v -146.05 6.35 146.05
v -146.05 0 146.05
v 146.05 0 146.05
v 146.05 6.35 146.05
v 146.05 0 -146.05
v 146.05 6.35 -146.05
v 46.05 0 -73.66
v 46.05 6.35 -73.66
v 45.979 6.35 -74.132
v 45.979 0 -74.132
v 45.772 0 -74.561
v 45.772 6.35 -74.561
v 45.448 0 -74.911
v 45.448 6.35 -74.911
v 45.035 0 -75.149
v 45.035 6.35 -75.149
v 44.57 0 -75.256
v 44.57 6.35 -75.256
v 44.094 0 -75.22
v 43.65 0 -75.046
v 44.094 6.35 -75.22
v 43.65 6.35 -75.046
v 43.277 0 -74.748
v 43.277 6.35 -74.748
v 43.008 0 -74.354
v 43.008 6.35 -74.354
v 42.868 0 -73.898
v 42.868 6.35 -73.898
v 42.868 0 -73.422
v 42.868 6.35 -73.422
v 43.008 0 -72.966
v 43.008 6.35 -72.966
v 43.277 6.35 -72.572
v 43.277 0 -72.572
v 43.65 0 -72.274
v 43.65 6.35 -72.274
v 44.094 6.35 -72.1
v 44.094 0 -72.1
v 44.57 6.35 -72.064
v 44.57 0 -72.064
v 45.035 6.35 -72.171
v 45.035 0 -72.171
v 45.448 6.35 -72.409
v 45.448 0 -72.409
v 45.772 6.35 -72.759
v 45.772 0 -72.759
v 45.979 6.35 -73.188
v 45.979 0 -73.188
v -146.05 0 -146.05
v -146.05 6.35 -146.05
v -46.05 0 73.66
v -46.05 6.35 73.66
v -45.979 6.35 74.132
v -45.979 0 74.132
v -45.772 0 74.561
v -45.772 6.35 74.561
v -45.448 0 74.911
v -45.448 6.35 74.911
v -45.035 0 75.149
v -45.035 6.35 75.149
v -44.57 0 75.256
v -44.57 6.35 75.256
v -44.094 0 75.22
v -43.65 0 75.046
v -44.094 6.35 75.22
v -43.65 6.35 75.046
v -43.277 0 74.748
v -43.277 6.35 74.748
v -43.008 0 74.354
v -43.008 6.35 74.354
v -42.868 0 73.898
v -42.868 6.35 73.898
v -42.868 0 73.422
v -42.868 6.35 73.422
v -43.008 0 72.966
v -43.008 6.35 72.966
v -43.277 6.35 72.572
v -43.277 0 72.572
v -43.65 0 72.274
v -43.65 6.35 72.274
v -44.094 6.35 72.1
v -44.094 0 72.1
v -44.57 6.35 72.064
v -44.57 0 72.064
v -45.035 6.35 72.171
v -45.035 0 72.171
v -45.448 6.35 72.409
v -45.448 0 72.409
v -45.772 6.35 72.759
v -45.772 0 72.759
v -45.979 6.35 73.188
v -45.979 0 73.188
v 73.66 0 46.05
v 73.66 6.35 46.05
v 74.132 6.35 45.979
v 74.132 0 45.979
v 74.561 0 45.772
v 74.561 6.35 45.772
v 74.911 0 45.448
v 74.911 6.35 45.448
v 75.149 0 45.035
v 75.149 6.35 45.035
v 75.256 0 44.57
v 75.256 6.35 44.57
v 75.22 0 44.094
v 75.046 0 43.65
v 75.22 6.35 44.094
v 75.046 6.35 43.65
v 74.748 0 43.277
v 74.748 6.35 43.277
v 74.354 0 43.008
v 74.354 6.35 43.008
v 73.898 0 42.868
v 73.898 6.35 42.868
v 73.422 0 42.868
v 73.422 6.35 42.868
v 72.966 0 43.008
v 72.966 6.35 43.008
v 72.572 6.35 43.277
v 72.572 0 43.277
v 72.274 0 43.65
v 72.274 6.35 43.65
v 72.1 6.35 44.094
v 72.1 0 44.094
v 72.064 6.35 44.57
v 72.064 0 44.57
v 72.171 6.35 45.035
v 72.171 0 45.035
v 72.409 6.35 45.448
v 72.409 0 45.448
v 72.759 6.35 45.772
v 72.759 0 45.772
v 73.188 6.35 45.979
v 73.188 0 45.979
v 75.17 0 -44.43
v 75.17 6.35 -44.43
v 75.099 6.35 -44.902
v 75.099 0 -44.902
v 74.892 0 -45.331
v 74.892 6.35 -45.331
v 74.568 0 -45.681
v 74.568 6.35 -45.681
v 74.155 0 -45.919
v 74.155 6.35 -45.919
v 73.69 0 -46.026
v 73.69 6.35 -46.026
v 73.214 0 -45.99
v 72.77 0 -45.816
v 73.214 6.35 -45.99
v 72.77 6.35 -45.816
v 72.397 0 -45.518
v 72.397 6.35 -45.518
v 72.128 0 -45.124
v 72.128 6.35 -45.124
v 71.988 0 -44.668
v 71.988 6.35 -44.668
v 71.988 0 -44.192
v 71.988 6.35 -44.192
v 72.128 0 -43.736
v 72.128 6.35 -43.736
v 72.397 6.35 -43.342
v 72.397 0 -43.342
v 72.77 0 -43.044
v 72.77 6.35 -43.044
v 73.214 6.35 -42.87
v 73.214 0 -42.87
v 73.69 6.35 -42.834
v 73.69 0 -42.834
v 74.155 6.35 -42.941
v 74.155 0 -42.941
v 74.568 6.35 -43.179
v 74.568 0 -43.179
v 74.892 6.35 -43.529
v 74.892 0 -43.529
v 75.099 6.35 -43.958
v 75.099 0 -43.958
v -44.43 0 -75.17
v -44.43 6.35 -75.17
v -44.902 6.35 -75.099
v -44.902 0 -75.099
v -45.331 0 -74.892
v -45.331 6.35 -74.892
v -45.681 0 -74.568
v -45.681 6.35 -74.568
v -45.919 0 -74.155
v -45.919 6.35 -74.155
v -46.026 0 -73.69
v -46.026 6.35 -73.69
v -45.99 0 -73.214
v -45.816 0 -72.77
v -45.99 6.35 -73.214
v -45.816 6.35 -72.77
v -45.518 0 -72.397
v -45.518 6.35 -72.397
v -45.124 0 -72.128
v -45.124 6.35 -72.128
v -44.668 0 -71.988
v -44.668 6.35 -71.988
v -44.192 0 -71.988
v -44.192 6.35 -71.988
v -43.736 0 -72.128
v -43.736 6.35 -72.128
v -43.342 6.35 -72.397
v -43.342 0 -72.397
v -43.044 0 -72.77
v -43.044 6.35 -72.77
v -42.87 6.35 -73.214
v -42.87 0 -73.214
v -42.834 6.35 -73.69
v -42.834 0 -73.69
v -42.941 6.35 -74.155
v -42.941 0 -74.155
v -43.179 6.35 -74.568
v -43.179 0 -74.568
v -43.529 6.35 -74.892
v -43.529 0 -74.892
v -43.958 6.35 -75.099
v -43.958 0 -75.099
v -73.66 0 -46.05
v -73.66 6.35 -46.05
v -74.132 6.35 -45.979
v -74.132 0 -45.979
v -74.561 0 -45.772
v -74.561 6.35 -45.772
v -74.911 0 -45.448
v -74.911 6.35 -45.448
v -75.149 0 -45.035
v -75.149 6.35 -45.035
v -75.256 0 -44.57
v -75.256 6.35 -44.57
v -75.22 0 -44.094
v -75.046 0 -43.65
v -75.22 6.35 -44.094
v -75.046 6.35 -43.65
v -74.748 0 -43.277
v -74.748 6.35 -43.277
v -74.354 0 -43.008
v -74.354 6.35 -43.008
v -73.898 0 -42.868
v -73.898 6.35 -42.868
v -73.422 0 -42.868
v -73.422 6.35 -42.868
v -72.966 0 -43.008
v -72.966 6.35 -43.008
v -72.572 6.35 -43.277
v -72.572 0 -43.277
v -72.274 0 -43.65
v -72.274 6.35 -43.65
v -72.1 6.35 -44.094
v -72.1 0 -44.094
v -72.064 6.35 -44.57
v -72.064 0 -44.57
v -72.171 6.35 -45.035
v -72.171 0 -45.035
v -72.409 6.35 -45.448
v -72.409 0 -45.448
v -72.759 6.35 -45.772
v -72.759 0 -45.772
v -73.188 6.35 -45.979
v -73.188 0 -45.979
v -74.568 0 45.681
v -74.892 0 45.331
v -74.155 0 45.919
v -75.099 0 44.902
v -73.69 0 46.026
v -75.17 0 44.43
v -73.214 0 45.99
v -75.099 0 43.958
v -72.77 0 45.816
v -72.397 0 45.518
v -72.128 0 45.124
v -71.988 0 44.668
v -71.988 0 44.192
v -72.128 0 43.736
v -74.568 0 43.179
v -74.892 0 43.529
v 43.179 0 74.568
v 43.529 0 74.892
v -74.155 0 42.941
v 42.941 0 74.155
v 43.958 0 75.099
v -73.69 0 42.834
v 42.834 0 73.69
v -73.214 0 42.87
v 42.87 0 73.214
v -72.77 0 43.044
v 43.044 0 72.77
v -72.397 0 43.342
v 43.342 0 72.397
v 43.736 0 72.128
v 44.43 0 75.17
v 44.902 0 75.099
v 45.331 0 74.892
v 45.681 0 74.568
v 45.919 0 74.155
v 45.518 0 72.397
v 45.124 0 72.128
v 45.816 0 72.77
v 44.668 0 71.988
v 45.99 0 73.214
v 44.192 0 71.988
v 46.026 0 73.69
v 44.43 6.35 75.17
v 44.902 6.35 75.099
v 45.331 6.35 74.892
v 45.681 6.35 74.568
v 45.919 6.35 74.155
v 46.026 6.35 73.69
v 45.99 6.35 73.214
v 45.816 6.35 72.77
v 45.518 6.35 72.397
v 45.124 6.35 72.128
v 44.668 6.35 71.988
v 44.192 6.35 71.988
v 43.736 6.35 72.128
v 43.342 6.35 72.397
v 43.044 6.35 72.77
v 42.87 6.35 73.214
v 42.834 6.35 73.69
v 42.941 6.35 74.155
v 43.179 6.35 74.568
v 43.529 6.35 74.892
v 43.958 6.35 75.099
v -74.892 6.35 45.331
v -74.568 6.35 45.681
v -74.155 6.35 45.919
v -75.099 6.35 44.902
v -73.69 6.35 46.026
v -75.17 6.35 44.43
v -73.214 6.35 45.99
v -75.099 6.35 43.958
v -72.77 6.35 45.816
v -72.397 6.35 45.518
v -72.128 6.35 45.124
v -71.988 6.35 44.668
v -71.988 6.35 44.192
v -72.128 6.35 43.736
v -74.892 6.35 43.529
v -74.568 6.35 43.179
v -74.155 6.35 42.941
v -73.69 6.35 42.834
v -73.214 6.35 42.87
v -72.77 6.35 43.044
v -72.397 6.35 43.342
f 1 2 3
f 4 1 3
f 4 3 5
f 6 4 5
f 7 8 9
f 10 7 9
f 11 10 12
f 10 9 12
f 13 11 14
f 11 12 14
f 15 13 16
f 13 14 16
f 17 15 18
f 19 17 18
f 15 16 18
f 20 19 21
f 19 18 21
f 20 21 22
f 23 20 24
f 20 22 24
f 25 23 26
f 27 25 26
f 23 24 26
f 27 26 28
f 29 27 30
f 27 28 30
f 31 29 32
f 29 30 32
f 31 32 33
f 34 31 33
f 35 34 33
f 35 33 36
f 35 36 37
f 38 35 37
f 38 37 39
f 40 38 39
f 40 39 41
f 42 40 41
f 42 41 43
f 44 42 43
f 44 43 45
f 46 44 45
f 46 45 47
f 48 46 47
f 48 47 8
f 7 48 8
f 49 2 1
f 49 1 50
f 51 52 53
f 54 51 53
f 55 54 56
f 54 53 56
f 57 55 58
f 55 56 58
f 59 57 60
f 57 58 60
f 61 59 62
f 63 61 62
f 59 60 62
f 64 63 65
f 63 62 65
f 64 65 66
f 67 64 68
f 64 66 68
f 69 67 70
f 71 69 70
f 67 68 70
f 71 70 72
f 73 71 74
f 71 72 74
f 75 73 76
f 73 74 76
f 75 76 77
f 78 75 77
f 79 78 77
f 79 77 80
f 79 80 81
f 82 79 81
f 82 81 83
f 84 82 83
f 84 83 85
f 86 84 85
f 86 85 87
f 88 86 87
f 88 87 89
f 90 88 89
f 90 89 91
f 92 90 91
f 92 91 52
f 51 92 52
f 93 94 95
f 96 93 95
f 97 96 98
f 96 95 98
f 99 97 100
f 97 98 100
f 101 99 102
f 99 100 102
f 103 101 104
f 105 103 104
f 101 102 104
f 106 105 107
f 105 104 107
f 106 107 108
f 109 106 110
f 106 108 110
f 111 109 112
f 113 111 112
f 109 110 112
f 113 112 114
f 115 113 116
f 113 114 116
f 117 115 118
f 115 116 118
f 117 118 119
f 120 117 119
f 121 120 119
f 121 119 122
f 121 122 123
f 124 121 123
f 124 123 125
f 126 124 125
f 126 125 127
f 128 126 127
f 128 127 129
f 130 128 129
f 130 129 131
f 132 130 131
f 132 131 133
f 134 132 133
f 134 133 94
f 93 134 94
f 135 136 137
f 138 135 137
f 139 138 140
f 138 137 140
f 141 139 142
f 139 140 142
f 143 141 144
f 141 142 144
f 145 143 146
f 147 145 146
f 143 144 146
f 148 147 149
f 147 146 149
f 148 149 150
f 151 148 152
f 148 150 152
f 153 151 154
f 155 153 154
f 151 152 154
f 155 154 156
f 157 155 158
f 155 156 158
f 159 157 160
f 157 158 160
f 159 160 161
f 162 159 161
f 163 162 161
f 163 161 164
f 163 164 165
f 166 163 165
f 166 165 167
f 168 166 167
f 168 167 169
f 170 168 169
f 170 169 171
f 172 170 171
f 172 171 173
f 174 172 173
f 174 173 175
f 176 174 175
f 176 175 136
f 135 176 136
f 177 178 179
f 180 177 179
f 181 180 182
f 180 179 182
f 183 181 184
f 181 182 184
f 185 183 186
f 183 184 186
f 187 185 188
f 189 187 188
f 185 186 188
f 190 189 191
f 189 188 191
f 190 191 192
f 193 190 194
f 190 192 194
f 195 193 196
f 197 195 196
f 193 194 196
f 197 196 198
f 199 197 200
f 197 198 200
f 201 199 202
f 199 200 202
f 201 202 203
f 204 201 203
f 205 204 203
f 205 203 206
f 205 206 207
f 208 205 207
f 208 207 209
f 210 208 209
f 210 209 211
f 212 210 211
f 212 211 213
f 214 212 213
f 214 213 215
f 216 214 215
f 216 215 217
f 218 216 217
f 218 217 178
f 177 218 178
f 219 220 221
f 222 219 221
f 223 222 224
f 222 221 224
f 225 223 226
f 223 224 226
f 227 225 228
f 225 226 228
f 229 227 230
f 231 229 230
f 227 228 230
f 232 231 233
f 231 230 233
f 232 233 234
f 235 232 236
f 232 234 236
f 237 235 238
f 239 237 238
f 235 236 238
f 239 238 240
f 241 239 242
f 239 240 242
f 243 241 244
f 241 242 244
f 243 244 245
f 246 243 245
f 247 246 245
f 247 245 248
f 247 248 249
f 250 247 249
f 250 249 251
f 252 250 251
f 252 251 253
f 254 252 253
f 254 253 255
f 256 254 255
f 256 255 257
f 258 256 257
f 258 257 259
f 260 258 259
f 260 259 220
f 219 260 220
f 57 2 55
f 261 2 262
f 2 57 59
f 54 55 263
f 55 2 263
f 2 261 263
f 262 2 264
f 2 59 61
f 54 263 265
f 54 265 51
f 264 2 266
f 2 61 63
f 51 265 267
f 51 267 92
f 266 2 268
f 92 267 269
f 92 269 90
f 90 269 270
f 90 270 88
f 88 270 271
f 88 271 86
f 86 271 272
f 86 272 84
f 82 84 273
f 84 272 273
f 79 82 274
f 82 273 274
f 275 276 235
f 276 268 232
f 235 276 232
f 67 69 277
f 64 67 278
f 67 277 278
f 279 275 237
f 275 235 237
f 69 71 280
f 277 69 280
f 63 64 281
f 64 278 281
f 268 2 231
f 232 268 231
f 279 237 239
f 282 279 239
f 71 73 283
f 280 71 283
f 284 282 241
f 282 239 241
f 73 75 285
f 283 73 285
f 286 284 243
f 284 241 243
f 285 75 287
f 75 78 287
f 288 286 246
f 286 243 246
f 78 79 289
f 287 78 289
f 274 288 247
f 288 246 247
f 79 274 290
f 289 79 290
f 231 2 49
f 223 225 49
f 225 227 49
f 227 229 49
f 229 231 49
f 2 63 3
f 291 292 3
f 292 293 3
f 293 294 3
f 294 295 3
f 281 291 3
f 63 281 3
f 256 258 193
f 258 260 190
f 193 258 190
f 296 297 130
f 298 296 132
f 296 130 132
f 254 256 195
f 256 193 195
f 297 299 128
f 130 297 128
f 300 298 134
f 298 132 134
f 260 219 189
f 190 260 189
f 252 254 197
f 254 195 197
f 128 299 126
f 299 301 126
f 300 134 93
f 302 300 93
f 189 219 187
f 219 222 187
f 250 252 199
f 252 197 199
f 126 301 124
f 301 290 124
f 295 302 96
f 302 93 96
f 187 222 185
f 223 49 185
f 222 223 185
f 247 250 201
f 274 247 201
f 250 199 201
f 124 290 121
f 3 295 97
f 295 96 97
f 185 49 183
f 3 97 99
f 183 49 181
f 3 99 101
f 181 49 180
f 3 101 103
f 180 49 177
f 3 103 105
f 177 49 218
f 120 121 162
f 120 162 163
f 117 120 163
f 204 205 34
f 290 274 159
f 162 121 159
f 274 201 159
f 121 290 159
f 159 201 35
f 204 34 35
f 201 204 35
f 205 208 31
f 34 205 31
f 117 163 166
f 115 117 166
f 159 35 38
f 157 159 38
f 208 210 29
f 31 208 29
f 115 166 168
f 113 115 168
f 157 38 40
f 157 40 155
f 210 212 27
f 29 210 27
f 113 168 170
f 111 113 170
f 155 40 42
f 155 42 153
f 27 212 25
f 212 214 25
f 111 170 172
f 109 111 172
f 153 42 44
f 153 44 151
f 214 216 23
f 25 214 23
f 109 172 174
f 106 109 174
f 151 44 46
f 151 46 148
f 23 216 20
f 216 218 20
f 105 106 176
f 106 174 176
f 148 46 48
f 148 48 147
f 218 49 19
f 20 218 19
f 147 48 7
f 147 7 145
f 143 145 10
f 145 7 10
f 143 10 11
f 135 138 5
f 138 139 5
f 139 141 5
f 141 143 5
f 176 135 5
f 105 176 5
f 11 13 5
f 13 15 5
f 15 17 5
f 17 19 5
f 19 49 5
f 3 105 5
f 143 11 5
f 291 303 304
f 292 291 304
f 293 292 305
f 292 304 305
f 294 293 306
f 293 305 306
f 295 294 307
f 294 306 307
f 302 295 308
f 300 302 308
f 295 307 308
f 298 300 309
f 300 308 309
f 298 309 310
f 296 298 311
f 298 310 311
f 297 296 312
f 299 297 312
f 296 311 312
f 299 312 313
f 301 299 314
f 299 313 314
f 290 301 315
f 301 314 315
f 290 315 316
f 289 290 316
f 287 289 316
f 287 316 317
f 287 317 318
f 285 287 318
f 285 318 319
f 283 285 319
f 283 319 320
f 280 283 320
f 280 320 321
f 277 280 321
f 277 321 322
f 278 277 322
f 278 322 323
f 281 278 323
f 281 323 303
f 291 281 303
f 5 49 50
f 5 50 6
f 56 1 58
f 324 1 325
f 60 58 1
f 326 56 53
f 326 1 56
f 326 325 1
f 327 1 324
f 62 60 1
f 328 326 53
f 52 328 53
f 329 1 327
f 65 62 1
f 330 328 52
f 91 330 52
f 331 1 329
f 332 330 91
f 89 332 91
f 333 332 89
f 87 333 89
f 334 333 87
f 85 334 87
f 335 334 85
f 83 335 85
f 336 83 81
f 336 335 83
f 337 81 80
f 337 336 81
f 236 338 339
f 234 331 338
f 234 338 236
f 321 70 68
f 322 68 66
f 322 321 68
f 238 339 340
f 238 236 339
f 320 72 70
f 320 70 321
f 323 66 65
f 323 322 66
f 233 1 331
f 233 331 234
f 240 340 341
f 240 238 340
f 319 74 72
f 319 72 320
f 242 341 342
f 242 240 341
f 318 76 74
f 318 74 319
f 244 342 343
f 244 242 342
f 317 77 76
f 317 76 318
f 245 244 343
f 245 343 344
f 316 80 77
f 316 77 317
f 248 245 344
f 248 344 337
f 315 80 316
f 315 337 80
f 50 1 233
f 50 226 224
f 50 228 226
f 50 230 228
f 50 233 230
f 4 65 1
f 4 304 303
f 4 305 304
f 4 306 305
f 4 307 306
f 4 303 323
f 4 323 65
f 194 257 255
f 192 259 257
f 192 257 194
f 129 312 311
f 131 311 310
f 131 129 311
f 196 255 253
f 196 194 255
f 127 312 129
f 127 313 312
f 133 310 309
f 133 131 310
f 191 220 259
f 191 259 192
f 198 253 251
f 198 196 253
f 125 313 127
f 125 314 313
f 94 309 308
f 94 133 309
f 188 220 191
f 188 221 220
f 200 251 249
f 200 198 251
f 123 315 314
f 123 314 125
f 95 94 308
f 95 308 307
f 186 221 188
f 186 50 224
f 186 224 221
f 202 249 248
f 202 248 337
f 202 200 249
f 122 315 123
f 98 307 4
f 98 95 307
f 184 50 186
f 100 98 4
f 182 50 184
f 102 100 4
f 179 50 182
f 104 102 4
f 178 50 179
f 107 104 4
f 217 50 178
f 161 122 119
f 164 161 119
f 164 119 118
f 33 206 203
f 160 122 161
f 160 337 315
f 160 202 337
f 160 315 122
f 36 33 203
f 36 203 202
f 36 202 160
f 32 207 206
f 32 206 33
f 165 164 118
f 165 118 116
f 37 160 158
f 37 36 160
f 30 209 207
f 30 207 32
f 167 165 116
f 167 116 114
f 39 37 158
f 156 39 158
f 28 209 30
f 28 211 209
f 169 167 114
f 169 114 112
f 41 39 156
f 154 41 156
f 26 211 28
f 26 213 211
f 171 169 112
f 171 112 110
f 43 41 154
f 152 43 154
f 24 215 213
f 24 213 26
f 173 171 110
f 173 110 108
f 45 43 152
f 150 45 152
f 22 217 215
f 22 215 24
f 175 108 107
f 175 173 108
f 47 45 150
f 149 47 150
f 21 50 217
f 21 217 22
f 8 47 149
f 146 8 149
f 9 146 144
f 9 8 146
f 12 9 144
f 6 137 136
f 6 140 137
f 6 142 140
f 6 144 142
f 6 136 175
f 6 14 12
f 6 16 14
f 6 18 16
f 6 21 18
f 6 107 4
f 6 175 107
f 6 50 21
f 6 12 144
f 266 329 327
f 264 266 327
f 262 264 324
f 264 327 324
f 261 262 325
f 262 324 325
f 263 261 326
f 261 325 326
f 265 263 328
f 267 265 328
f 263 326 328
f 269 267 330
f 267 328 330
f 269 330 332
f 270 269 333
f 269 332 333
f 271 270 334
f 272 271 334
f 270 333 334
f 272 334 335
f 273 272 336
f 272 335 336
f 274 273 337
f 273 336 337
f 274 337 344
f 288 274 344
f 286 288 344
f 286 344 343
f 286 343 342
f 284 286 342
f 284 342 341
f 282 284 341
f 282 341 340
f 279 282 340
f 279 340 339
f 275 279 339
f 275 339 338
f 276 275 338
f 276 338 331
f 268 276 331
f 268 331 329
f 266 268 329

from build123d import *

# Parameters (mm, degrees)
SKETCH1_W           = 292.1
SKETCH1_H           = 292.1
BOSS_EXTRUDE1_DEPTH = 6.35
SKETCH2_R           = 1.599999975
CUT_EXTRUDE1_DEPTH  = 207.64347921
CIRPATTERN1_COUNT   = 4


with BuildPart() as part:
    # Sketch1 → Boss-Extrude1 (new body)
    with BuildSketch(Plane(origin=(0, 0, 0), x_dir=(1, 0, 0), z_dir=(0, 1, 0))):
        Rectangle(SKETCH1_W, SKETCH1_H)
    extrude(amount=BOSS_EXTRUDE1_DEPTH)

    # Sketch2 → Cut-Extrude1 (cut, through all)
    with BuildSketch(Plane(origin=(0, 6.35, 0), x_dir=(1, 0, 0), z_dir=(0, 1, 0))):
        with Locations((73.66, -44.45)):
            Circle(SKETCH2_R)
        with Locations((44.43000004, -73.569999926)):
            Circle(SKETCH2_R)
    cut_extrude1 = extrude(amount=-CUT_EXTRUDE1_DEPTH, mode=Mode.SUBTRACT)

    # CirPattern1: Cut-Extrude1 ×4 about axis
    cirpattern1_axis = Axis((0, 6.35, 0), (0, 1, 0))
    for i in range(1, CIRPATTERN1_COUNT):
        add(cut_extrude1.rotate(cirpattern1_axis, i * 360 / CIRPATTERN1_COUNT), mode=Mode.SUBTRACT)


solid = part.part
